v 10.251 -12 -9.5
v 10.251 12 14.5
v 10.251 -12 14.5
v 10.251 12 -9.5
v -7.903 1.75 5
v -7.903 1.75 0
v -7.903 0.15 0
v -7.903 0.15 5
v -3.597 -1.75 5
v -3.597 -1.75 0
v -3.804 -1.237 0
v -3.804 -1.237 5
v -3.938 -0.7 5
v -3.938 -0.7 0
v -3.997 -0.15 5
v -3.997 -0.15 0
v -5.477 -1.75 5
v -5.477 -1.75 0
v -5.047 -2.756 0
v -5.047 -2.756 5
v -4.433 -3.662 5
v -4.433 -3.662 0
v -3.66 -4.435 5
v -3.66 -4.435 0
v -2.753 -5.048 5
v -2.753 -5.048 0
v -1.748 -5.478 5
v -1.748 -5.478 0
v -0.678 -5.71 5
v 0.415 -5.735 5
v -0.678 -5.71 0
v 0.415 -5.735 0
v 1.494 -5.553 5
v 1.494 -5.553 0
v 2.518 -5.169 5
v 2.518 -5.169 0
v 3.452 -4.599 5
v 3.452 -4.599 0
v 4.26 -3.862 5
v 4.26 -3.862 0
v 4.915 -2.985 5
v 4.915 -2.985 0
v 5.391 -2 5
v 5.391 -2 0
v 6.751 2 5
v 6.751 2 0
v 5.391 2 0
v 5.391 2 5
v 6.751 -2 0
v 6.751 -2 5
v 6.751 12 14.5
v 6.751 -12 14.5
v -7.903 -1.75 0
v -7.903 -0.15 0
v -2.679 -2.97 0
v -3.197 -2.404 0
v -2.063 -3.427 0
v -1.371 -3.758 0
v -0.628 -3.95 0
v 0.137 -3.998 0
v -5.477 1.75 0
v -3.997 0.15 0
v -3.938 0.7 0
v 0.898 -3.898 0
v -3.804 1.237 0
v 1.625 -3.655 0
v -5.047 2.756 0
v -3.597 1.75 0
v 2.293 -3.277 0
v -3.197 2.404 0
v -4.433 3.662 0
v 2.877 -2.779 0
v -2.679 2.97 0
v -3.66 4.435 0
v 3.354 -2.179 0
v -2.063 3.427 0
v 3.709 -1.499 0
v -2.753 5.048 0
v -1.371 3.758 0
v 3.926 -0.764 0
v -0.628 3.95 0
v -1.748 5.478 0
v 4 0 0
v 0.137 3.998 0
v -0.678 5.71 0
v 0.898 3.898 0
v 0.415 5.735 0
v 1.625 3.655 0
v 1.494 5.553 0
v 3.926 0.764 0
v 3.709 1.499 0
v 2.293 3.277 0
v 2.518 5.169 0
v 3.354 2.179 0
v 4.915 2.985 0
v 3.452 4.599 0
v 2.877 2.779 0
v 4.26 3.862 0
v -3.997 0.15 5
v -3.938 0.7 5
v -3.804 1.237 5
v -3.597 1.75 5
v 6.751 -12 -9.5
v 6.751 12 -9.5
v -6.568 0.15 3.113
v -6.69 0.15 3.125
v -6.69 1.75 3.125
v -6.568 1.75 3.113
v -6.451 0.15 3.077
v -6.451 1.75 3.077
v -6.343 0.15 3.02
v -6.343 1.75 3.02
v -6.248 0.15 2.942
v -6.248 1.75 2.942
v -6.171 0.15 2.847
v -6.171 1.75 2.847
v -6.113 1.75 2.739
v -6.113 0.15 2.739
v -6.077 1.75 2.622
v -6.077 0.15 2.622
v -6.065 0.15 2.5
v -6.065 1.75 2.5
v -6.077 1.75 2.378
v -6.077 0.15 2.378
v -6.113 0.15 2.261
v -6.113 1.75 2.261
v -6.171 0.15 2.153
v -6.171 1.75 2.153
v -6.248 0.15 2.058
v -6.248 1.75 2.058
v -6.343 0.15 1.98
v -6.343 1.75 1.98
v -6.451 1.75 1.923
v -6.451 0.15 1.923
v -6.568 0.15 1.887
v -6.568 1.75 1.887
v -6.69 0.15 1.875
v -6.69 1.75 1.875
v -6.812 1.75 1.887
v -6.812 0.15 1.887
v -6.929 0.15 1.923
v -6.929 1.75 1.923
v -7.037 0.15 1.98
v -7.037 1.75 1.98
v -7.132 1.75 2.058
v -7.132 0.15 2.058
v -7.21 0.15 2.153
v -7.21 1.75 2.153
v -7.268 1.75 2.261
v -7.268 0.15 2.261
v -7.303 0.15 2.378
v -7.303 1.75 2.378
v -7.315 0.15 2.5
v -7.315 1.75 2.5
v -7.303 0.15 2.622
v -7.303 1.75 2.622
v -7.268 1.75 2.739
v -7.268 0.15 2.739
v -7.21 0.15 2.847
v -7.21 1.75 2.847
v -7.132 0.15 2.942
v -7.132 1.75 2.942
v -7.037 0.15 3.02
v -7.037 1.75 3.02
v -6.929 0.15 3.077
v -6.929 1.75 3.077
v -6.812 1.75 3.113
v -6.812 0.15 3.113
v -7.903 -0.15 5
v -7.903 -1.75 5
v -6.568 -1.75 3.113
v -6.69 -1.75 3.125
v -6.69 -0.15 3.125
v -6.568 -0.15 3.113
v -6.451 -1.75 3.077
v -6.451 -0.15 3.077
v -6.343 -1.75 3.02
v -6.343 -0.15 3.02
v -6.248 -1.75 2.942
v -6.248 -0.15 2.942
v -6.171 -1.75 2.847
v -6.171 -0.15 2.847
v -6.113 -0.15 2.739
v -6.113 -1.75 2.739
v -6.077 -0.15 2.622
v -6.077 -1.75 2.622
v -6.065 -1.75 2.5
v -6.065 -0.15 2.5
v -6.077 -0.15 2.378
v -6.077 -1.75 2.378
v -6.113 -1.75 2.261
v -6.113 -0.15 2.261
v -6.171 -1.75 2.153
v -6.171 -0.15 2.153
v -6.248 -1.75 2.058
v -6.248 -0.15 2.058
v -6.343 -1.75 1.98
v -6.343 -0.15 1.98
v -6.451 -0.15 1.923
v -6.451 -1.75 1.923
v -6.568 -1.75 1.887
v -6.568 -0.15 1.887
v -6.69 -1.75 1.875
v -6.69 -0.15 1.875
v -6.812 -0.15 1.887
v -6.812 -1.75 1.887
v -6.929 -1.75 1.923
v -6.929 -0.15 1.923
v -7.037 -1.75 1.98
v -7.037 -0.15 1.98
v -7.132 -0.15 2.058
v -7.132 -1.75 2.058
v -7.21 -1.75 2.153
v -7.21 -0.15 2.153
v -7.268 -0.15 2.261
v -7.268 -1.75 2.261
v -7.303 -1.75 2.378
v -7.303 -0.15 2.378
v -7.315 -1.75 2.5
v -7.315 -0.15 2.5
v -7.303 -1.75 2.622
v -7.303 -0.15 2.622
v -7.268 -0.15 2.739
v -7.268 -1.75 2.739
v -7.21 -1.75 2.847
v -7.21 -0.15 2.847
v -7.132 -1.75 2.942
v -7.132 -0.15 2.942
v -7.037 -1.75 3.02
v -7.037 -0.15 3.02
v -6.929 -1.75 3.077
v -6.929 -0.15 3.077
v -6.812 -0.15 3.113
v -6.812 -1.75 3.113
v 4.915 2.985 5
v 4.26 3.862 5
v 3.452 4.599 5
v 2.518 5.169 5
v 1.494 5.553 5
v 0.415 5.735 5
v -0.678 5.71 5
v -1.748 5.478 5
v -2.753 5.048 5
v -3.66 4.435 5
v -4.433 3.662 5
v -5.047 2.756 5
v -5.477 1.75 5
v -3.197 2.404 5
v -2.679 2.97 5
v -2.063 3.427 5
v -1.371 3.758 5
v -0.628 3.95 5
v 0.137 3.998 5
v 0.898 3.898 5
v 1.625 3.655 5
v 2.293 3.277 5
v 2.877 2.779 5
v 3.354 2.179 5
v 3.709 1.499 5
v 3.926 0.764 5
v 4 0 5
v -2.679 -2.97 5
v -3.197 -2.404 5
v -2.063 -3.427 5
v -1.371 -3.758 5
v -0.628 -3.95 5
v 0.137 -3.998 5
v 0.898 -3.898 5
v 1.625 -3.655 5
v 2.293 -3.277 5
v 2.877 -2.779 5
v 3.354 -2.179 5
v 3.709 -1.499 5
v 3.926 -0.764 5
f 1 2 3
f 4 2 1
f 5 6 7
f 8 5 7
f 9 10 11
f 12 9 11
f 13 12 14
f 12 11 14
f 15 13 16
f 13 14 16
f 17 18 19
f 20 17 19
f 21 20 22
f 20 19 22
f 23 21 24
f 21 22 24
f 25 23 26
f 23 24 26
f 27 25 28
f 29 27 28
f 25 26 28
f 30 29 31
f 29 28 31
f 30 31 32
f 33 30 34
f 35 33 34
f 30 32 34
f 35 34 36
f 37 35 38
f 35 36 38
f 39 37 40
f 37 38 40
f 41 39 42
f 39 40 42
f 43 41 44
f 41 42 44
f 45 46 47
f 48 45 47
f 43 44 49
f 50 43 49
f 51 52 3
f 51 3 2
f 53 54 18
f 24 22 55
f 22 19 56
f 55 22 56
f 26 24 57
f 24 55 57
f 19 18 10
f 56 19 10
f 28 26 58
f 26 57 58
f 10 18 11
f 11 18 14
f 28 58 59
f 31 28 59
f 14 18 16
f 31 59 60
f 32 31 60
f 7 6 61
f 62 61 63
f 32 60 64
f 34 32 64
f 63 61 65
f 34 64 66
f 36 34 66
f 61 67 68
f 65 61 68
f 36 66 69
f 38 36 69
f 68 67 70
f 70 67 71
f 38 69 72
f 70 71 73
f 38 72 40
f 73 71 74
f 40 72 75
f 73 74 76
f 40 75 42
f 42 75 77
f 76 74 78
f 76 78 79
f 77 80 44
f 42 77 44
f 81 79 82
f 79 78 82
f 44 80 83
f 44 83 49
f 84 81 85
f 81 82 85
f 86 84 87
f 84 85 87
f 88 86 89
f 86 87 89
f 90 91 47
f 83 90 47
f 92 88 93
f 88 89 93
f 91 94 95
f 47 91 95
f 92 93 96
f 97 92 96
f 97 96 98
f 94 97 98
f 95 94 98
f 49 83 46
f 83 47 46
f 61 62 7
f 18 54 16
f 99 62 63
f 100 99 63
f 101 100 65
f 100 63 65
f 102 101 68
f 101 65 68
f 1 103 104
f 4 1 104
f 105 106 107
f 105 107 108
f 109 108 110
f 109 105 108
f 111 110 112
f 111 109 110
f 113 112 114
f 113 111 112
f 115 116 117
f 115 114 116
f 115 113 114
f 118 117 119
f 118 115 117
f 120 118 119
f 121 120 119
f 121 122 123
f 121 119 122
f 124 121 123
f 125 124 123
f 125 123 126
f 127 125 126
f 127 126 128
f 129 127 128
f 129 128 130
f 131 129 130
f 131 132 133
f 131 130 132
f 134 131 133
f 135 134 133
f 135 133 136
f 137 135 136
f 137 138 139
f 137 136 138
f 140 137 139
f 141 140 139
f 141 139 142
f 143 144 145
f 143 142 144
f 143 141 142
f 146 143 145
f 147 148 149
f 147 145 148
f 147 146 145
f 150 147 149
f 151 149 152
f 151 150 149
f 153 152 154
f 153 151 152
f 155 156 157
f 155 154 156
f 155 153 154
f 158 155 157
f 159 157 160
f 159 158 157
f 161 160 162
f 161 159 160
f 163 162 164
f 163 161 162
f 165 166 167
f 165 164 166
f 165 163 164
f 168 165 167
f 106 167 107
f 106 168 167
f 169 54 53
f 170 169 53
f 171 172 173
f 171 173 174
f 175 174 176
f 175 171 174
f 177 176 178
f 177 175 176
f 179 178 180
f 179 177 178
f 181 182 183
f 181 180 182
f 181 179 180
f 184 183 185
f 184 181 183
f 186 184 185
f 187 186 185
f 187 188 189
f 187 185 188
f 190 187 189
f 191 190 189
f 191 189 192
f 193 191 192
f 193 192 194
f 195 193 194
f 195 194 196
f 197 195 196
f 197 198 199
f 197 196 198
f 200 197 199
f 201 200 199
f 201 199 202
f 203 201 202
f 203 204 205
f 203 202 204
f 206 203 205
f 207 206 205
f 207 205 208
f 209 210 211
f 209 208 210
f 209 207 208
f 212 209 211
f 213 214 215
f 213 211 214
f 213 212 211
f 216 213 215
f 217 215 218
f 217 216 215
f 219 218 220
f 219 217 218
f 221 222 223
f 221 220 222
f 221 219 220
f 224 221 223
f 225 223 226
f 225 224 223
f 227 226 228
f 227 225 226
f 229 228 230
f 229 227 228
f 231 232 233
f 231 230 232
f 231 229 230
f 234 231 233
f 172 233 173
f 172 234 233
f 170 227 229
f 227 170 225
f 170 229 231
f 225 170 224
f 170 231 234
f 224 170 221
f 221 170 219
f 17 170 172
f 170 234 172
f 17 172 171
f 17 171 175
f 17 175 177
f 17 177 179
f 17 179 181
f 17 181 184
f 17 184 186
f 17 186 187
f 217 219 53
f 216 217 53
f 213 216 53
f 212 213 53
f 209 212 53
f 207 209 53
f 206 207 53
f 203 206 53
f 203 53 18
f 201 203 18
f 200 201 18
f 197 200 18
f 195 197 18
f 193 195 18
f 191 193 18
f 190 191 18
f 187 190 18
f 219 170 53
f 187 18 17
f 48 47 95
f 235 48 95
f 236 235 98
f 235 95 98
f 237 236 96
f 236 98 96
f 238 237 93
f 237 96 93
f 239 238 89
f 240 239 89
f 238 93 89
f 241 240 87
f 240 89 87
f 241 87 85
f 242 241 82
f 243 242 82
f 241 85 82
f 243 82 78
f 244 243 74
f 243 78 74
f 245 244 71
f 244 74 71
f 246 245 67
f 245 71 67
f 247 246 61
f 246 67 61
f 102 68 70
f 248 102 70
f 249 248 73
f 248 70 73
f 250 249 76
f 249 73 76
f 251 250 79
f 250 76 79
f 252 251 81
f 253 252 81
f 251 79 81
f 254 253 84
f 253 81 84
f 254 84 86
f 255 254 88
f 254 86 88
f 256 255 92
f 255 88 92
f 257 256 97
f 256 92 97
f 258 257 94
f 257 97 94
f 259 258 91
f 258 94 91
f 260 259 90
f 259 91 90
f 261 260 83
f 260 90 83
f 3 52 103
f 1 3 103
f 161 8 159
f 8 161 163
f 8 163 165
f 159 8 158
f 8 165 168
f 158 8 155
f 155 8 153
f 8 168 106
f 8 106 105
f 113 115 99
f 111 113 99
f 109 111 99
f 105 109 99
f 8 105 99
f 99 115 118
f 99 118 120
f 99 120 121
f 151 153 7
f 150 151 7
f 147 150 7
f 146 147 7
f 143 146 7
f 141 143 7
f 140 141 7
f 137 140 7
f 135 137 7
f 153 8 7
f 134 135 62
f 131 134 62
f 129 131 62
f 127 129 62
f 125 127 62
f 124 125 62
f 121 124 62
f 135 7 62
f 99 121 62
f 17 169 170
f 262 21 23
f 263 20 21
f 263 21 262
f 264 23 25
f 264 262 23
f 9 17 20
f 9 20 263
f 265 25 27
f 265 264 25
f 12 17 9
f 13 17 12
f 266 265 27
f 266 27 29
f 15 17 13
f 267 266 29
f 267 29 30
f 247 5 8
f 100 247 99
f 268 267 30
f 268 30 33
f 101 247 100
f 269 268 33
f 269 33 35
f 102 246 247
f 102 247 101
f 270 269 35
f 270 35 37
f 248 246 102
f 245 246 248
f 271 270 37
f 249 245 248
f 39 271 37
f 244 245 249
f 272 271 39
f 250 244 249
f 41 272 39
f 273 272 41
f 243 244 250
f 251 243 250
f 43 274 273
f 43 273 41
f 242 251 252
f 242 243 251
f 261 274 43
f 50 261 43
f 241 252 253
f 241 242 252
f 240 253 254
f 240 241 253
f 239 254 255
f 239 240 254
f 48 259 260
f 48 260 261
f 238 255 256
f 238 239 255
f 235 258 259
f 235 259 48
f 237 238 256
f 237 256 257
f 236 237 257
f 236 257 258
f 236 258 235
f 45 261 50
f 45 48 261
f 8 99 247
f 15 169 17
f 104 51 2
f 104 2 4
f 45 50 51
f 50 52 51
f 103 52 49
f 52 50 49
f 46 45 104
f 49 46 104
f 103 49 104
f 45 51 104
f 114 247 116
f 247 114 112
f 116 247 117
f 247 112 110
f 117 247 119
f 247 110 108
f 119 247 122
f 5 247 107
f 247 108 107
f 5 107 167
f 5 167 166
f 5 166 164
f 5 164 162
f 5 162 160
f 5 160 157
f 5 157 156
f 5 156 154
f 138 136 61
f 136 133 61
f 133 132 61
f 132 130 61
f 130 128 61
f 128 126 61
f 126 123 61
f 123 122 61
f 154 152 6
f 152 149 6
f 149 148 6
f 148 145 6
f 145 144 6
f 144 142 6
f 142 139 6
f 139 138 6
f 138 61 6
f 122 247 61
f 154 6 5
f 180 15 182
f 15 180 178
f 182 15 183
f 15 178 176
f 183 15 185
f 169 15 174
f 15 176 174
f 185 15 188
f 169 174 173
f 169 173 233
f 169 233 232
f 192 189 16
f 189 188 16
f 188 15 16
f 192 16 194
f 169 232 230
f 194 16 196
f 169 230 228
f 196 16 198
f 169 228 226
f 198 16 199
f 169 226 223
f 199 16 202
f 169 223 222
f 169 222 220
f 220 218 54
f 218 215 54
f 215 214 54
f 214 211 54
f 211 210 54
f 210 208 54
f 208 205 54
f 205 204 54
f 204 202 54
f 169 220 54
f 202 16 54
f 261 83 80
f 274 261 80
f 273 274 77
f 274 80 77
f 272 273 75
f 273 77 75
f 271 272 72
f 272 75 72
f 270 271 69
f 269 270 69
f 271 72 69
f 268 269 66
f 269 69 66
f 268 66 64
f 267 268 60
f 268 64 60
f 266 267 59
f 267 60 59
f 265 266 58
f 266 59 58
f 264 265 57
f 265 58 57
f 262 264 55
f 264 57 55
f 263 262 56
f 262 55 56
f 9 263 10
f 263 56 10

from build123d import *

# Parameters (mm, degrees)
SALIENTE_EXTRUIR3_DEPTH    = 5
CORTAR_EXTRUIR2_DEPTH      = 11.978246956
CORTAR_EXTRUIR2_DEPTH_BACK = 11.978246956
CROQUIS5_R                 = 0.625
CROQUIS7_W                 = 24
CROQUIS7_H                 = 24
SALIENTE_EXTRUIR5_DEPTH    = 3.5


with BuildPart() as part:
    # Croquis1 → Saliente-Extruir3 (new body)
    with BuildSketch(Plane.XY):
        with BuildLine():
            ThreePointArc((5.390964663, 2), (-0.132231752, 5.748479344), (-5.477225575, 1.75))
            Line((-5.477225575, 1.75), (-3.596873642, 1.75))
            ThreePointArc((-3.596873642, 1.75), (0.897915762, 3.897915762), (4, 0))
            ThreePointArc((4, 0), (0.897915762, -3.897915762), (-3.596873642, -1.75))
            Line((-3.596873642, -1.75), (-5.477225575, -1.75))
            ThreePointArc((-5.477225575, -1.75), (-0.132231752, -5.748479344), (5.390964663, -2))
            Line((5.390964663, -2), (4.749257399, -2))
            Line((4.749257399, -2), (4.749257399, 2))
            Line((4.749257399, 2), (5.390964663, 2))
        make_face()
        with BuildLine():
            Line((-5.748043145, -0.15), (-7.903126358, -0.15))
            Line((-7.903126358, -0.15), (-7.903126358, -1.75))
            Line((-7.903126358, -1.75), (-5.477225575, -1.75))
            ThreePointArc((-5.477225575, -1.75), (-5.66936191, -0.959601761), (-5.748043145, -0.15))
        make_face()
        with BuildLine():
            Line((-5.477225575, 1.75), (-7.903126358, 1.75))
            Line((-7.903126358, 1.75), (-7.903126358, 0.15))
            Line((-7.903126358, 0.15), (-5.748043145, 0.15))
            ThreePointArc((-5.748043145, 0.15), (-5.66936191, 0.959601761), (-5.477225575, 1.75))
        make_face()
        with BuildLine():
            Line((-3.596873642, 1.75), (-5.477225575, 1.75))
            ThreePointArc((-5.477225575, 1.75), (-5.66936191, 0.959601761), (-5.748043145, 0.15))
            Line((-5.748043145, 0.15), (-3.997186511, 0.15))
            ThreePointArc((-3.997186511, 0.15), (-3.880391398, 0.970856631), (-3.596873642, 1.75))
        make_face()
        with BuildLine():
            Line((-3.997186511, -0.15), (-5.748043145, -0.15))
            ThreePointArc((-5.748043145, -0.15), (-5.66936191, -0.959601761), (-5.477225575, -1.75))
            Line((-5.477225575, -1.75), (-3.596873642, -1.75))
            ThreePointArc((-3.596873642, -1.75), (-3.880391398, -0.970856631), (-3.997186511, -0.15))
        make_face()
        with BuildLine():
            Line((6.750742601, 2), (5.390964663, 2))
            ThreePointArc((5.390964663, 2), (5.659529433, 1.015985528), (5.75, 0))
            ThreePointArc((5.75, 0), (5.659529433, -1.015985528), (5.390964663, -2))
            Line((5.390964663, -2), (6.750742601, -2))
            Line((6.750742601, -2), (6.750742601, 2))
        make_face()
        with BuildLine():
            ThreePointArc((5.75, 0), (5.659529433, 1.015985528), (5.390964663, 2))
            Line((5.390964663, 2), (4.749257399, 2))
            Line((4.749257399, 2), (4.749257399, -2))
            Line((4.749257399, -2), (5.390964663, -2))
            ThreePointArc((5.390964663, -2), (5.659529433, -1.015985528), (5.75, 0))
        make_face()
    extrude(amount=SALIENTE_EXTRUIR3_DEPTH)

    # Croquis5 → Cortar-Extruir2 (cut, two sides: drawn at the far end of the back side and taken through both)
    with BuildSketch(Plane(origin=(0, 0, 0), x_dir=(1, 0, 0), z_dir=(0, 1, 0)).offset(-CORTAR_EXTRUIR2_DEPTH_BACK)):
        with Locations(Location((-6.690175966, -2.5, 0), (0, 0, 270))):
            Circle(CROQUIS5_R)
    extrude(amount=CORTAR_EXTRUIR2_DEPTH + CORTAR_EXTRUIR2_DEPTH_BACK, mode=Mode.SUBTRACT)

    # Croquis7 → Saliente-Extruir5 (add)
    with BuildSketch(Plane(origin=(6.750742601, 0, 0), x_dir=(0, 0, -1), z_dir=(1, 0, 0))):
        with Locations((-2.5, 0)):
            Rectangle(CROQUIS7_W, CROQUIS7_H)
    extrude(amount=SALIENTE_EXTRUIR5_DEPTH)


solid = part.part
